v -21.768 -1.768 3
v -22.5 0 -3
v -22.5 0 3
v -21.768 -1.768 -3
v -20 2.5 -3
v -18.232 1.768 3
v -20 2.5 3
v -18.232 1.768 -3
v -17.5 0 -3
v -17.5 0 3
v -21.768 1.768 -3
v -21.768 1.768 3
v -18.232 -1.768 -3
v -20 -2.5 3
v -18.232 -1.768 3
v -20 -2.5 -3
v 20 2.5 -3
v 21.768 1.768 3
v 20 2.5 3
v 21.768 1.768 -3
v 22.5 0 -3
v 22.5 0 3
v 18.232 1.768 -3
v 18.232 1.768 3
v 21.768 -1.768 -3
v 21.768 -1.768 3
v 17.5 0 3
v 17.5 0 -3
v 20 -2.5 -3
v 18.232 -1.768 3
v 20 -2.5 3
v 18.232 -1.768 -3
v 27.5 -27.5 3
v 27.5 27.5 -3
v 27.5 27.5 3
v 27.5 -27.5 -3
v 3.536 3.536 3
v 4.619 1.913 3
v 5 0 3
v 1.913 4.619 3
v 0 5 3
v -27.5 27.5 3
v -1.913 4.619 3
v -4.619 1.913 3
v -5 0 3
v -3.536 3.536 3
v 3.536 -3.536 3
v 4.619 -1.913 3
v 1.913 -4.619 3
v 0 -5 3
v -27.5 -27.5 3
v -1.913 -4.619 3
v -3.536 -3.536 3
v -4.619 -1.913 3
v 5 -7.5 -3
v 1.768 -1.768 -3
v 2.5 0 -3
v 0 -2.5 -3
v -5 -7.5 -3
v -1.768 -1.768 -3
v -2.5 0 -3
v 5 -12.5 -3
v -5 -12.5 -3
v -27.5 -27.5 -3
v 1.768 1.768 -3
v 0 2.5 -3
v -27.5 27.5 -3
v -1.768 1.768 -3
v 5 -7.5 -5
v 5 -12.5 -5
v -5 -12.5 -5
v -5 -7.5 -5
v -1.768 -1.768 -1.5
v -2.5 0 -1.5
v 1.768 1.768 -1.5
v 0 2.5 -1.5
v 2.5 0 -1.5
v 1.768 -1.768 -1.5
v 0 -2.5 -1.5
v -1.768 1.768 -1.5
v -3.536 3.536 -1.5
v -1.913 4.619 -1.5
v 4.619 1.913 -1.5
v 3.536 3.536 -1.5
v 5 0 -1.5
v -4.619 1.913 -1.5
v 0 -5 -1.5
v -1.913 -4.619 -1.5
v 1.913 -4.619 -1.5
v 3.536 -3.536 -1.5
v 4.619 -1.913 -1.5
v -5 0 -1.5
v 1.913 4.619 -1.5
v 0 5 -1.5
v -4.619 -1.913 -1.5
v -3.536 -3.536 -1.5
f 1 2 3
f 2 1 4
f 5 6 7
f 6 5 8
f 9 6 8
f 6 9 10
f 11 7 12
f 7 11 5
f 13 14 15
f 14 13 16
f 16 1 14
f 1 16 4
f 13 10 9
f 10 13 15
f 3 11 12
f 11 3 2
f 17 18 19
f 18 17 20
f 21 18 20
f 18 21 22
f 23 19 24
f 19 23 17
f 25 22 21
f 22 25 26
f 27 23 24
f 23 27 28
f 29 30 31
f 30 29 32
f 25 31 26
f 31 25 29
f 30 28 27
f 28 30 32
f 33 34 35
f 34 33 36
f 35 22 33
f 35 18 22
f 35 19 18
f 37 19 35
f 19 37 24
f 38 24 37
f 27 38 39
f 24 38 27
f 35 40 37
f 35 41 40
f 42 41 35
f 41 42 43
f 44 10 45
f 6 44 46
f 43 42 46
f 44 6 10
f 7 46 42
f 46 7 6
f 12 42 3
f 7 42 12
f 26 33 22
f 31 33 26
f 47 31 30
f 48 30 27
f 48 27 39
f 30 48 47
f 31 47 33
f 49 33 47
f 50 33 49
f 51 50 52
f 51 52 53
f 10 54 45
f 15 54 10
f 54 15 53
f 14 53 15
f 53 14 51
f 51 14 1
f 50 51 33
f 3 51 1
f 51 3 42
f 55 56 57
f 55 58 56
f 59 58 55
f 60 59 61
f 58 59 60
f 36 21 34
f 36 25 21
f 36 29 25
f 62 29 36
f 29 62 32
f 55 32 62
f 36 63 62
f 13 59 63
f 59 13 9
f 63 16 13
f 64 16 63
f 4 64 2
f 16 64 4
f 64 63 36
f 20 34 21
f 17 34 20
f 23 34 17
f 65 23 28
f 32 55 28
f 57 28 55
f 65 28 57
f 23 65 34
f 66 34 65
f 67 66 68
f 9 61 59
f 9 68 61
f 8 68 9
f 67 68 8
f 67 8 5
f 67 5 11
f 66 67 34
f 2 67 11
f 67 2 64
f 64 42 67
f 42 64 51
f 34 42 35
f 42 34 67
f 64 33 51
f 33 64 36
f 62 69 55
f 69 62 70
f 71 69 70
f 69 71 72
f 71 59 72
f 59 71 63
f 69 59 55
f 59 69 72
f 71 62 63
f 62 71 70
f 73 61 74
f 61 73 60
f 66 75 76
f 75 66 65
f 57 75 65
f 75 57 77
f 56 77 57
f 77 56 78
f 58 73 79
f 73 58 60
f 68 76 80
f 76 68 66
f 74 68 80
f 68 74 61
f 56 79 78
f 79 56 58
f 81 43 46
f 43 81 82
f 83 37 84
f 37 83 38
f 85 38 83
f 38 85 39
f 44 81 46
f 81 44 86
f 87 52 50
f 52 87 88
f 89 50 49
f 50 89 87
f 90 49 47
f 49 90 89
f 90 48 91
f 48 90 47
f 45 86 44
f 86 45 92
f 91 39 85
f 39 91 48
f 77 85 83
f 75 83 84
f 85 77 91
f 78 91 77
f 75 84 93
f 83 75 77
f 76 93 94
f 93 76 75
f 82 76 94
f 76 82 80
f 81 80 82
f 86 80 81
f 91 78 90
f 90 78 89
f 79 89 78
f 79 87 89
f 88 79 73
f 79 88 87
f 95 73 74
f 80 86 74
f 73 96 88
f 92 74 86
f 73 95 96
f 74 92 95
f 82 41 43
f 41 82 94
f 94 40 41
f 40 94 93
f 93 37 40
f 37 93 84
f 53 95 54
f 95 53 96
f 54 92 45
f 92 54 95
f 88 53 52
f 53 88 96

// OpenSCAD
// Makerspace Card System
// Stand and mount for swipe-out panel
// Print the stand and mount separately.
// The printable implementations of the models are at the bottom of the file.

// Hardware dimensions
screw_d = 5;

// Base dimensions
base_l = 190;
base_w = 120;
base_t = 6;

// Column dimensions
col_d = 25;
col_h = 80;
col_offset = col_h/2 + base_t/2;

// Mount dimensions
mount_angle = 25;
mount_l = 55;
mount_w = 55;
mount_t = 6;
mount_form_t = mount_t*3;
mount_offset = col_h + base_t - 10;

// Nub dimensions
nub_l = 10;
nub_w = 5;
nub_t = 5;

// Explosion factor
e_factor = 0;

// Mount module
module mount()
{
	difference()
	{
		cube([mount_l,mount_w,mount_t], center=true);
		for(i=[-20,20])
			translate([i,0,0]) cylinder(d=screw_d,h=mount_t+2, center=true);
	}	
	translate([0,-10,-mount_t/2+nub_t/2-2])
		cube([nub_l,nub_w,nub_t], center=true);

}

// Mount form for trimming the column
module mount_form()
{
	translate([0,0,mount_form_t/2-mount_t/2])
		cube([mount_l-1,mount_w-1,mount_form_t], center=true);
	cylinder(d=screw_d,h=60, center=true); // hole for screw
	translate([0,0,-15]) hull()
	{
		translate([0,0,0]) cylinder(d=screw_d*2,h=screw_d,center=true); //space for nut
		translate([0,7,0]) cylinder(d=screw_d*2,h=screw_d,center=true); //space for nut
	}
	translate([0,-10,-mount_t+nub_t/2-1])
			cube([nub_l,nub_w,nub_t], center=true);

}

// Base module
module base()
{
	translate([0,-10,0])
		cube([base_l,base_w,base_t], center=true);
}

module curved_base()
{
	translate([0,-32,0])
	difference()
	{
		scale([1.7,.9,1])
			cylinder(d=base_l,h=base_t, center=true);
		translate([0,-base_w/3,0])
			scale([1.4,.9,1.2])
				cylinder(d=base_l,h=base_t, center=true);
	}	
}

// Column module
module column()
{
	translate([0,0,col_offset])
		cylinder(d=col_d,h=col_h, center=true);
}

// Demonstrate stand model
module exploded_demo()
{
	rotate([mount_angle,0,0])
	{
		translate([0,0,e_factor]) 
			difference() // mount
			{
				mount();
				cylinder(d=screw_d,h=50, center=true); // arbitrary length; hole for screw
				translate([0,0,-mount_t/4]) cylinder(d=screw_d*2,h=mount_t); // for screw head
			}
		translate([0,-10,mount_t/2+1+e_factor*2])
		{
			%cube([200,150,2], center=true); // panel model; use % in front to make translucent
			translate([50,-120,0]) cube([2,90,10], center=true);
		}
	}
	difference() // base + column - mount_form
	{
		translate([0,0,-mount_offset]) 
		{
			column();
			base();
		}
		rotate([mount_angle,0,0])
			mount_form();
	}
}

// Final Models
module final_mount()
{
	difference() // mount
	{
		mount();
		cylinder(d=screw_d,h=50, center=true); // arbitrary length; hole for screw
		translate([0,0,-mount_t/4]) cylinder(d=screw_d*2,h=mount_t); // for screw head
	}
}

module final_stand()
{
	difference() // base + column - mount_form
	{
		translate([0,0,-mount_offset]) 
		{
			column();
			base();
		}
		rotate([mount_angle,0,0])
			mount_form();
	}
}


// Place things to print here
//final_stand();
final_mount();
